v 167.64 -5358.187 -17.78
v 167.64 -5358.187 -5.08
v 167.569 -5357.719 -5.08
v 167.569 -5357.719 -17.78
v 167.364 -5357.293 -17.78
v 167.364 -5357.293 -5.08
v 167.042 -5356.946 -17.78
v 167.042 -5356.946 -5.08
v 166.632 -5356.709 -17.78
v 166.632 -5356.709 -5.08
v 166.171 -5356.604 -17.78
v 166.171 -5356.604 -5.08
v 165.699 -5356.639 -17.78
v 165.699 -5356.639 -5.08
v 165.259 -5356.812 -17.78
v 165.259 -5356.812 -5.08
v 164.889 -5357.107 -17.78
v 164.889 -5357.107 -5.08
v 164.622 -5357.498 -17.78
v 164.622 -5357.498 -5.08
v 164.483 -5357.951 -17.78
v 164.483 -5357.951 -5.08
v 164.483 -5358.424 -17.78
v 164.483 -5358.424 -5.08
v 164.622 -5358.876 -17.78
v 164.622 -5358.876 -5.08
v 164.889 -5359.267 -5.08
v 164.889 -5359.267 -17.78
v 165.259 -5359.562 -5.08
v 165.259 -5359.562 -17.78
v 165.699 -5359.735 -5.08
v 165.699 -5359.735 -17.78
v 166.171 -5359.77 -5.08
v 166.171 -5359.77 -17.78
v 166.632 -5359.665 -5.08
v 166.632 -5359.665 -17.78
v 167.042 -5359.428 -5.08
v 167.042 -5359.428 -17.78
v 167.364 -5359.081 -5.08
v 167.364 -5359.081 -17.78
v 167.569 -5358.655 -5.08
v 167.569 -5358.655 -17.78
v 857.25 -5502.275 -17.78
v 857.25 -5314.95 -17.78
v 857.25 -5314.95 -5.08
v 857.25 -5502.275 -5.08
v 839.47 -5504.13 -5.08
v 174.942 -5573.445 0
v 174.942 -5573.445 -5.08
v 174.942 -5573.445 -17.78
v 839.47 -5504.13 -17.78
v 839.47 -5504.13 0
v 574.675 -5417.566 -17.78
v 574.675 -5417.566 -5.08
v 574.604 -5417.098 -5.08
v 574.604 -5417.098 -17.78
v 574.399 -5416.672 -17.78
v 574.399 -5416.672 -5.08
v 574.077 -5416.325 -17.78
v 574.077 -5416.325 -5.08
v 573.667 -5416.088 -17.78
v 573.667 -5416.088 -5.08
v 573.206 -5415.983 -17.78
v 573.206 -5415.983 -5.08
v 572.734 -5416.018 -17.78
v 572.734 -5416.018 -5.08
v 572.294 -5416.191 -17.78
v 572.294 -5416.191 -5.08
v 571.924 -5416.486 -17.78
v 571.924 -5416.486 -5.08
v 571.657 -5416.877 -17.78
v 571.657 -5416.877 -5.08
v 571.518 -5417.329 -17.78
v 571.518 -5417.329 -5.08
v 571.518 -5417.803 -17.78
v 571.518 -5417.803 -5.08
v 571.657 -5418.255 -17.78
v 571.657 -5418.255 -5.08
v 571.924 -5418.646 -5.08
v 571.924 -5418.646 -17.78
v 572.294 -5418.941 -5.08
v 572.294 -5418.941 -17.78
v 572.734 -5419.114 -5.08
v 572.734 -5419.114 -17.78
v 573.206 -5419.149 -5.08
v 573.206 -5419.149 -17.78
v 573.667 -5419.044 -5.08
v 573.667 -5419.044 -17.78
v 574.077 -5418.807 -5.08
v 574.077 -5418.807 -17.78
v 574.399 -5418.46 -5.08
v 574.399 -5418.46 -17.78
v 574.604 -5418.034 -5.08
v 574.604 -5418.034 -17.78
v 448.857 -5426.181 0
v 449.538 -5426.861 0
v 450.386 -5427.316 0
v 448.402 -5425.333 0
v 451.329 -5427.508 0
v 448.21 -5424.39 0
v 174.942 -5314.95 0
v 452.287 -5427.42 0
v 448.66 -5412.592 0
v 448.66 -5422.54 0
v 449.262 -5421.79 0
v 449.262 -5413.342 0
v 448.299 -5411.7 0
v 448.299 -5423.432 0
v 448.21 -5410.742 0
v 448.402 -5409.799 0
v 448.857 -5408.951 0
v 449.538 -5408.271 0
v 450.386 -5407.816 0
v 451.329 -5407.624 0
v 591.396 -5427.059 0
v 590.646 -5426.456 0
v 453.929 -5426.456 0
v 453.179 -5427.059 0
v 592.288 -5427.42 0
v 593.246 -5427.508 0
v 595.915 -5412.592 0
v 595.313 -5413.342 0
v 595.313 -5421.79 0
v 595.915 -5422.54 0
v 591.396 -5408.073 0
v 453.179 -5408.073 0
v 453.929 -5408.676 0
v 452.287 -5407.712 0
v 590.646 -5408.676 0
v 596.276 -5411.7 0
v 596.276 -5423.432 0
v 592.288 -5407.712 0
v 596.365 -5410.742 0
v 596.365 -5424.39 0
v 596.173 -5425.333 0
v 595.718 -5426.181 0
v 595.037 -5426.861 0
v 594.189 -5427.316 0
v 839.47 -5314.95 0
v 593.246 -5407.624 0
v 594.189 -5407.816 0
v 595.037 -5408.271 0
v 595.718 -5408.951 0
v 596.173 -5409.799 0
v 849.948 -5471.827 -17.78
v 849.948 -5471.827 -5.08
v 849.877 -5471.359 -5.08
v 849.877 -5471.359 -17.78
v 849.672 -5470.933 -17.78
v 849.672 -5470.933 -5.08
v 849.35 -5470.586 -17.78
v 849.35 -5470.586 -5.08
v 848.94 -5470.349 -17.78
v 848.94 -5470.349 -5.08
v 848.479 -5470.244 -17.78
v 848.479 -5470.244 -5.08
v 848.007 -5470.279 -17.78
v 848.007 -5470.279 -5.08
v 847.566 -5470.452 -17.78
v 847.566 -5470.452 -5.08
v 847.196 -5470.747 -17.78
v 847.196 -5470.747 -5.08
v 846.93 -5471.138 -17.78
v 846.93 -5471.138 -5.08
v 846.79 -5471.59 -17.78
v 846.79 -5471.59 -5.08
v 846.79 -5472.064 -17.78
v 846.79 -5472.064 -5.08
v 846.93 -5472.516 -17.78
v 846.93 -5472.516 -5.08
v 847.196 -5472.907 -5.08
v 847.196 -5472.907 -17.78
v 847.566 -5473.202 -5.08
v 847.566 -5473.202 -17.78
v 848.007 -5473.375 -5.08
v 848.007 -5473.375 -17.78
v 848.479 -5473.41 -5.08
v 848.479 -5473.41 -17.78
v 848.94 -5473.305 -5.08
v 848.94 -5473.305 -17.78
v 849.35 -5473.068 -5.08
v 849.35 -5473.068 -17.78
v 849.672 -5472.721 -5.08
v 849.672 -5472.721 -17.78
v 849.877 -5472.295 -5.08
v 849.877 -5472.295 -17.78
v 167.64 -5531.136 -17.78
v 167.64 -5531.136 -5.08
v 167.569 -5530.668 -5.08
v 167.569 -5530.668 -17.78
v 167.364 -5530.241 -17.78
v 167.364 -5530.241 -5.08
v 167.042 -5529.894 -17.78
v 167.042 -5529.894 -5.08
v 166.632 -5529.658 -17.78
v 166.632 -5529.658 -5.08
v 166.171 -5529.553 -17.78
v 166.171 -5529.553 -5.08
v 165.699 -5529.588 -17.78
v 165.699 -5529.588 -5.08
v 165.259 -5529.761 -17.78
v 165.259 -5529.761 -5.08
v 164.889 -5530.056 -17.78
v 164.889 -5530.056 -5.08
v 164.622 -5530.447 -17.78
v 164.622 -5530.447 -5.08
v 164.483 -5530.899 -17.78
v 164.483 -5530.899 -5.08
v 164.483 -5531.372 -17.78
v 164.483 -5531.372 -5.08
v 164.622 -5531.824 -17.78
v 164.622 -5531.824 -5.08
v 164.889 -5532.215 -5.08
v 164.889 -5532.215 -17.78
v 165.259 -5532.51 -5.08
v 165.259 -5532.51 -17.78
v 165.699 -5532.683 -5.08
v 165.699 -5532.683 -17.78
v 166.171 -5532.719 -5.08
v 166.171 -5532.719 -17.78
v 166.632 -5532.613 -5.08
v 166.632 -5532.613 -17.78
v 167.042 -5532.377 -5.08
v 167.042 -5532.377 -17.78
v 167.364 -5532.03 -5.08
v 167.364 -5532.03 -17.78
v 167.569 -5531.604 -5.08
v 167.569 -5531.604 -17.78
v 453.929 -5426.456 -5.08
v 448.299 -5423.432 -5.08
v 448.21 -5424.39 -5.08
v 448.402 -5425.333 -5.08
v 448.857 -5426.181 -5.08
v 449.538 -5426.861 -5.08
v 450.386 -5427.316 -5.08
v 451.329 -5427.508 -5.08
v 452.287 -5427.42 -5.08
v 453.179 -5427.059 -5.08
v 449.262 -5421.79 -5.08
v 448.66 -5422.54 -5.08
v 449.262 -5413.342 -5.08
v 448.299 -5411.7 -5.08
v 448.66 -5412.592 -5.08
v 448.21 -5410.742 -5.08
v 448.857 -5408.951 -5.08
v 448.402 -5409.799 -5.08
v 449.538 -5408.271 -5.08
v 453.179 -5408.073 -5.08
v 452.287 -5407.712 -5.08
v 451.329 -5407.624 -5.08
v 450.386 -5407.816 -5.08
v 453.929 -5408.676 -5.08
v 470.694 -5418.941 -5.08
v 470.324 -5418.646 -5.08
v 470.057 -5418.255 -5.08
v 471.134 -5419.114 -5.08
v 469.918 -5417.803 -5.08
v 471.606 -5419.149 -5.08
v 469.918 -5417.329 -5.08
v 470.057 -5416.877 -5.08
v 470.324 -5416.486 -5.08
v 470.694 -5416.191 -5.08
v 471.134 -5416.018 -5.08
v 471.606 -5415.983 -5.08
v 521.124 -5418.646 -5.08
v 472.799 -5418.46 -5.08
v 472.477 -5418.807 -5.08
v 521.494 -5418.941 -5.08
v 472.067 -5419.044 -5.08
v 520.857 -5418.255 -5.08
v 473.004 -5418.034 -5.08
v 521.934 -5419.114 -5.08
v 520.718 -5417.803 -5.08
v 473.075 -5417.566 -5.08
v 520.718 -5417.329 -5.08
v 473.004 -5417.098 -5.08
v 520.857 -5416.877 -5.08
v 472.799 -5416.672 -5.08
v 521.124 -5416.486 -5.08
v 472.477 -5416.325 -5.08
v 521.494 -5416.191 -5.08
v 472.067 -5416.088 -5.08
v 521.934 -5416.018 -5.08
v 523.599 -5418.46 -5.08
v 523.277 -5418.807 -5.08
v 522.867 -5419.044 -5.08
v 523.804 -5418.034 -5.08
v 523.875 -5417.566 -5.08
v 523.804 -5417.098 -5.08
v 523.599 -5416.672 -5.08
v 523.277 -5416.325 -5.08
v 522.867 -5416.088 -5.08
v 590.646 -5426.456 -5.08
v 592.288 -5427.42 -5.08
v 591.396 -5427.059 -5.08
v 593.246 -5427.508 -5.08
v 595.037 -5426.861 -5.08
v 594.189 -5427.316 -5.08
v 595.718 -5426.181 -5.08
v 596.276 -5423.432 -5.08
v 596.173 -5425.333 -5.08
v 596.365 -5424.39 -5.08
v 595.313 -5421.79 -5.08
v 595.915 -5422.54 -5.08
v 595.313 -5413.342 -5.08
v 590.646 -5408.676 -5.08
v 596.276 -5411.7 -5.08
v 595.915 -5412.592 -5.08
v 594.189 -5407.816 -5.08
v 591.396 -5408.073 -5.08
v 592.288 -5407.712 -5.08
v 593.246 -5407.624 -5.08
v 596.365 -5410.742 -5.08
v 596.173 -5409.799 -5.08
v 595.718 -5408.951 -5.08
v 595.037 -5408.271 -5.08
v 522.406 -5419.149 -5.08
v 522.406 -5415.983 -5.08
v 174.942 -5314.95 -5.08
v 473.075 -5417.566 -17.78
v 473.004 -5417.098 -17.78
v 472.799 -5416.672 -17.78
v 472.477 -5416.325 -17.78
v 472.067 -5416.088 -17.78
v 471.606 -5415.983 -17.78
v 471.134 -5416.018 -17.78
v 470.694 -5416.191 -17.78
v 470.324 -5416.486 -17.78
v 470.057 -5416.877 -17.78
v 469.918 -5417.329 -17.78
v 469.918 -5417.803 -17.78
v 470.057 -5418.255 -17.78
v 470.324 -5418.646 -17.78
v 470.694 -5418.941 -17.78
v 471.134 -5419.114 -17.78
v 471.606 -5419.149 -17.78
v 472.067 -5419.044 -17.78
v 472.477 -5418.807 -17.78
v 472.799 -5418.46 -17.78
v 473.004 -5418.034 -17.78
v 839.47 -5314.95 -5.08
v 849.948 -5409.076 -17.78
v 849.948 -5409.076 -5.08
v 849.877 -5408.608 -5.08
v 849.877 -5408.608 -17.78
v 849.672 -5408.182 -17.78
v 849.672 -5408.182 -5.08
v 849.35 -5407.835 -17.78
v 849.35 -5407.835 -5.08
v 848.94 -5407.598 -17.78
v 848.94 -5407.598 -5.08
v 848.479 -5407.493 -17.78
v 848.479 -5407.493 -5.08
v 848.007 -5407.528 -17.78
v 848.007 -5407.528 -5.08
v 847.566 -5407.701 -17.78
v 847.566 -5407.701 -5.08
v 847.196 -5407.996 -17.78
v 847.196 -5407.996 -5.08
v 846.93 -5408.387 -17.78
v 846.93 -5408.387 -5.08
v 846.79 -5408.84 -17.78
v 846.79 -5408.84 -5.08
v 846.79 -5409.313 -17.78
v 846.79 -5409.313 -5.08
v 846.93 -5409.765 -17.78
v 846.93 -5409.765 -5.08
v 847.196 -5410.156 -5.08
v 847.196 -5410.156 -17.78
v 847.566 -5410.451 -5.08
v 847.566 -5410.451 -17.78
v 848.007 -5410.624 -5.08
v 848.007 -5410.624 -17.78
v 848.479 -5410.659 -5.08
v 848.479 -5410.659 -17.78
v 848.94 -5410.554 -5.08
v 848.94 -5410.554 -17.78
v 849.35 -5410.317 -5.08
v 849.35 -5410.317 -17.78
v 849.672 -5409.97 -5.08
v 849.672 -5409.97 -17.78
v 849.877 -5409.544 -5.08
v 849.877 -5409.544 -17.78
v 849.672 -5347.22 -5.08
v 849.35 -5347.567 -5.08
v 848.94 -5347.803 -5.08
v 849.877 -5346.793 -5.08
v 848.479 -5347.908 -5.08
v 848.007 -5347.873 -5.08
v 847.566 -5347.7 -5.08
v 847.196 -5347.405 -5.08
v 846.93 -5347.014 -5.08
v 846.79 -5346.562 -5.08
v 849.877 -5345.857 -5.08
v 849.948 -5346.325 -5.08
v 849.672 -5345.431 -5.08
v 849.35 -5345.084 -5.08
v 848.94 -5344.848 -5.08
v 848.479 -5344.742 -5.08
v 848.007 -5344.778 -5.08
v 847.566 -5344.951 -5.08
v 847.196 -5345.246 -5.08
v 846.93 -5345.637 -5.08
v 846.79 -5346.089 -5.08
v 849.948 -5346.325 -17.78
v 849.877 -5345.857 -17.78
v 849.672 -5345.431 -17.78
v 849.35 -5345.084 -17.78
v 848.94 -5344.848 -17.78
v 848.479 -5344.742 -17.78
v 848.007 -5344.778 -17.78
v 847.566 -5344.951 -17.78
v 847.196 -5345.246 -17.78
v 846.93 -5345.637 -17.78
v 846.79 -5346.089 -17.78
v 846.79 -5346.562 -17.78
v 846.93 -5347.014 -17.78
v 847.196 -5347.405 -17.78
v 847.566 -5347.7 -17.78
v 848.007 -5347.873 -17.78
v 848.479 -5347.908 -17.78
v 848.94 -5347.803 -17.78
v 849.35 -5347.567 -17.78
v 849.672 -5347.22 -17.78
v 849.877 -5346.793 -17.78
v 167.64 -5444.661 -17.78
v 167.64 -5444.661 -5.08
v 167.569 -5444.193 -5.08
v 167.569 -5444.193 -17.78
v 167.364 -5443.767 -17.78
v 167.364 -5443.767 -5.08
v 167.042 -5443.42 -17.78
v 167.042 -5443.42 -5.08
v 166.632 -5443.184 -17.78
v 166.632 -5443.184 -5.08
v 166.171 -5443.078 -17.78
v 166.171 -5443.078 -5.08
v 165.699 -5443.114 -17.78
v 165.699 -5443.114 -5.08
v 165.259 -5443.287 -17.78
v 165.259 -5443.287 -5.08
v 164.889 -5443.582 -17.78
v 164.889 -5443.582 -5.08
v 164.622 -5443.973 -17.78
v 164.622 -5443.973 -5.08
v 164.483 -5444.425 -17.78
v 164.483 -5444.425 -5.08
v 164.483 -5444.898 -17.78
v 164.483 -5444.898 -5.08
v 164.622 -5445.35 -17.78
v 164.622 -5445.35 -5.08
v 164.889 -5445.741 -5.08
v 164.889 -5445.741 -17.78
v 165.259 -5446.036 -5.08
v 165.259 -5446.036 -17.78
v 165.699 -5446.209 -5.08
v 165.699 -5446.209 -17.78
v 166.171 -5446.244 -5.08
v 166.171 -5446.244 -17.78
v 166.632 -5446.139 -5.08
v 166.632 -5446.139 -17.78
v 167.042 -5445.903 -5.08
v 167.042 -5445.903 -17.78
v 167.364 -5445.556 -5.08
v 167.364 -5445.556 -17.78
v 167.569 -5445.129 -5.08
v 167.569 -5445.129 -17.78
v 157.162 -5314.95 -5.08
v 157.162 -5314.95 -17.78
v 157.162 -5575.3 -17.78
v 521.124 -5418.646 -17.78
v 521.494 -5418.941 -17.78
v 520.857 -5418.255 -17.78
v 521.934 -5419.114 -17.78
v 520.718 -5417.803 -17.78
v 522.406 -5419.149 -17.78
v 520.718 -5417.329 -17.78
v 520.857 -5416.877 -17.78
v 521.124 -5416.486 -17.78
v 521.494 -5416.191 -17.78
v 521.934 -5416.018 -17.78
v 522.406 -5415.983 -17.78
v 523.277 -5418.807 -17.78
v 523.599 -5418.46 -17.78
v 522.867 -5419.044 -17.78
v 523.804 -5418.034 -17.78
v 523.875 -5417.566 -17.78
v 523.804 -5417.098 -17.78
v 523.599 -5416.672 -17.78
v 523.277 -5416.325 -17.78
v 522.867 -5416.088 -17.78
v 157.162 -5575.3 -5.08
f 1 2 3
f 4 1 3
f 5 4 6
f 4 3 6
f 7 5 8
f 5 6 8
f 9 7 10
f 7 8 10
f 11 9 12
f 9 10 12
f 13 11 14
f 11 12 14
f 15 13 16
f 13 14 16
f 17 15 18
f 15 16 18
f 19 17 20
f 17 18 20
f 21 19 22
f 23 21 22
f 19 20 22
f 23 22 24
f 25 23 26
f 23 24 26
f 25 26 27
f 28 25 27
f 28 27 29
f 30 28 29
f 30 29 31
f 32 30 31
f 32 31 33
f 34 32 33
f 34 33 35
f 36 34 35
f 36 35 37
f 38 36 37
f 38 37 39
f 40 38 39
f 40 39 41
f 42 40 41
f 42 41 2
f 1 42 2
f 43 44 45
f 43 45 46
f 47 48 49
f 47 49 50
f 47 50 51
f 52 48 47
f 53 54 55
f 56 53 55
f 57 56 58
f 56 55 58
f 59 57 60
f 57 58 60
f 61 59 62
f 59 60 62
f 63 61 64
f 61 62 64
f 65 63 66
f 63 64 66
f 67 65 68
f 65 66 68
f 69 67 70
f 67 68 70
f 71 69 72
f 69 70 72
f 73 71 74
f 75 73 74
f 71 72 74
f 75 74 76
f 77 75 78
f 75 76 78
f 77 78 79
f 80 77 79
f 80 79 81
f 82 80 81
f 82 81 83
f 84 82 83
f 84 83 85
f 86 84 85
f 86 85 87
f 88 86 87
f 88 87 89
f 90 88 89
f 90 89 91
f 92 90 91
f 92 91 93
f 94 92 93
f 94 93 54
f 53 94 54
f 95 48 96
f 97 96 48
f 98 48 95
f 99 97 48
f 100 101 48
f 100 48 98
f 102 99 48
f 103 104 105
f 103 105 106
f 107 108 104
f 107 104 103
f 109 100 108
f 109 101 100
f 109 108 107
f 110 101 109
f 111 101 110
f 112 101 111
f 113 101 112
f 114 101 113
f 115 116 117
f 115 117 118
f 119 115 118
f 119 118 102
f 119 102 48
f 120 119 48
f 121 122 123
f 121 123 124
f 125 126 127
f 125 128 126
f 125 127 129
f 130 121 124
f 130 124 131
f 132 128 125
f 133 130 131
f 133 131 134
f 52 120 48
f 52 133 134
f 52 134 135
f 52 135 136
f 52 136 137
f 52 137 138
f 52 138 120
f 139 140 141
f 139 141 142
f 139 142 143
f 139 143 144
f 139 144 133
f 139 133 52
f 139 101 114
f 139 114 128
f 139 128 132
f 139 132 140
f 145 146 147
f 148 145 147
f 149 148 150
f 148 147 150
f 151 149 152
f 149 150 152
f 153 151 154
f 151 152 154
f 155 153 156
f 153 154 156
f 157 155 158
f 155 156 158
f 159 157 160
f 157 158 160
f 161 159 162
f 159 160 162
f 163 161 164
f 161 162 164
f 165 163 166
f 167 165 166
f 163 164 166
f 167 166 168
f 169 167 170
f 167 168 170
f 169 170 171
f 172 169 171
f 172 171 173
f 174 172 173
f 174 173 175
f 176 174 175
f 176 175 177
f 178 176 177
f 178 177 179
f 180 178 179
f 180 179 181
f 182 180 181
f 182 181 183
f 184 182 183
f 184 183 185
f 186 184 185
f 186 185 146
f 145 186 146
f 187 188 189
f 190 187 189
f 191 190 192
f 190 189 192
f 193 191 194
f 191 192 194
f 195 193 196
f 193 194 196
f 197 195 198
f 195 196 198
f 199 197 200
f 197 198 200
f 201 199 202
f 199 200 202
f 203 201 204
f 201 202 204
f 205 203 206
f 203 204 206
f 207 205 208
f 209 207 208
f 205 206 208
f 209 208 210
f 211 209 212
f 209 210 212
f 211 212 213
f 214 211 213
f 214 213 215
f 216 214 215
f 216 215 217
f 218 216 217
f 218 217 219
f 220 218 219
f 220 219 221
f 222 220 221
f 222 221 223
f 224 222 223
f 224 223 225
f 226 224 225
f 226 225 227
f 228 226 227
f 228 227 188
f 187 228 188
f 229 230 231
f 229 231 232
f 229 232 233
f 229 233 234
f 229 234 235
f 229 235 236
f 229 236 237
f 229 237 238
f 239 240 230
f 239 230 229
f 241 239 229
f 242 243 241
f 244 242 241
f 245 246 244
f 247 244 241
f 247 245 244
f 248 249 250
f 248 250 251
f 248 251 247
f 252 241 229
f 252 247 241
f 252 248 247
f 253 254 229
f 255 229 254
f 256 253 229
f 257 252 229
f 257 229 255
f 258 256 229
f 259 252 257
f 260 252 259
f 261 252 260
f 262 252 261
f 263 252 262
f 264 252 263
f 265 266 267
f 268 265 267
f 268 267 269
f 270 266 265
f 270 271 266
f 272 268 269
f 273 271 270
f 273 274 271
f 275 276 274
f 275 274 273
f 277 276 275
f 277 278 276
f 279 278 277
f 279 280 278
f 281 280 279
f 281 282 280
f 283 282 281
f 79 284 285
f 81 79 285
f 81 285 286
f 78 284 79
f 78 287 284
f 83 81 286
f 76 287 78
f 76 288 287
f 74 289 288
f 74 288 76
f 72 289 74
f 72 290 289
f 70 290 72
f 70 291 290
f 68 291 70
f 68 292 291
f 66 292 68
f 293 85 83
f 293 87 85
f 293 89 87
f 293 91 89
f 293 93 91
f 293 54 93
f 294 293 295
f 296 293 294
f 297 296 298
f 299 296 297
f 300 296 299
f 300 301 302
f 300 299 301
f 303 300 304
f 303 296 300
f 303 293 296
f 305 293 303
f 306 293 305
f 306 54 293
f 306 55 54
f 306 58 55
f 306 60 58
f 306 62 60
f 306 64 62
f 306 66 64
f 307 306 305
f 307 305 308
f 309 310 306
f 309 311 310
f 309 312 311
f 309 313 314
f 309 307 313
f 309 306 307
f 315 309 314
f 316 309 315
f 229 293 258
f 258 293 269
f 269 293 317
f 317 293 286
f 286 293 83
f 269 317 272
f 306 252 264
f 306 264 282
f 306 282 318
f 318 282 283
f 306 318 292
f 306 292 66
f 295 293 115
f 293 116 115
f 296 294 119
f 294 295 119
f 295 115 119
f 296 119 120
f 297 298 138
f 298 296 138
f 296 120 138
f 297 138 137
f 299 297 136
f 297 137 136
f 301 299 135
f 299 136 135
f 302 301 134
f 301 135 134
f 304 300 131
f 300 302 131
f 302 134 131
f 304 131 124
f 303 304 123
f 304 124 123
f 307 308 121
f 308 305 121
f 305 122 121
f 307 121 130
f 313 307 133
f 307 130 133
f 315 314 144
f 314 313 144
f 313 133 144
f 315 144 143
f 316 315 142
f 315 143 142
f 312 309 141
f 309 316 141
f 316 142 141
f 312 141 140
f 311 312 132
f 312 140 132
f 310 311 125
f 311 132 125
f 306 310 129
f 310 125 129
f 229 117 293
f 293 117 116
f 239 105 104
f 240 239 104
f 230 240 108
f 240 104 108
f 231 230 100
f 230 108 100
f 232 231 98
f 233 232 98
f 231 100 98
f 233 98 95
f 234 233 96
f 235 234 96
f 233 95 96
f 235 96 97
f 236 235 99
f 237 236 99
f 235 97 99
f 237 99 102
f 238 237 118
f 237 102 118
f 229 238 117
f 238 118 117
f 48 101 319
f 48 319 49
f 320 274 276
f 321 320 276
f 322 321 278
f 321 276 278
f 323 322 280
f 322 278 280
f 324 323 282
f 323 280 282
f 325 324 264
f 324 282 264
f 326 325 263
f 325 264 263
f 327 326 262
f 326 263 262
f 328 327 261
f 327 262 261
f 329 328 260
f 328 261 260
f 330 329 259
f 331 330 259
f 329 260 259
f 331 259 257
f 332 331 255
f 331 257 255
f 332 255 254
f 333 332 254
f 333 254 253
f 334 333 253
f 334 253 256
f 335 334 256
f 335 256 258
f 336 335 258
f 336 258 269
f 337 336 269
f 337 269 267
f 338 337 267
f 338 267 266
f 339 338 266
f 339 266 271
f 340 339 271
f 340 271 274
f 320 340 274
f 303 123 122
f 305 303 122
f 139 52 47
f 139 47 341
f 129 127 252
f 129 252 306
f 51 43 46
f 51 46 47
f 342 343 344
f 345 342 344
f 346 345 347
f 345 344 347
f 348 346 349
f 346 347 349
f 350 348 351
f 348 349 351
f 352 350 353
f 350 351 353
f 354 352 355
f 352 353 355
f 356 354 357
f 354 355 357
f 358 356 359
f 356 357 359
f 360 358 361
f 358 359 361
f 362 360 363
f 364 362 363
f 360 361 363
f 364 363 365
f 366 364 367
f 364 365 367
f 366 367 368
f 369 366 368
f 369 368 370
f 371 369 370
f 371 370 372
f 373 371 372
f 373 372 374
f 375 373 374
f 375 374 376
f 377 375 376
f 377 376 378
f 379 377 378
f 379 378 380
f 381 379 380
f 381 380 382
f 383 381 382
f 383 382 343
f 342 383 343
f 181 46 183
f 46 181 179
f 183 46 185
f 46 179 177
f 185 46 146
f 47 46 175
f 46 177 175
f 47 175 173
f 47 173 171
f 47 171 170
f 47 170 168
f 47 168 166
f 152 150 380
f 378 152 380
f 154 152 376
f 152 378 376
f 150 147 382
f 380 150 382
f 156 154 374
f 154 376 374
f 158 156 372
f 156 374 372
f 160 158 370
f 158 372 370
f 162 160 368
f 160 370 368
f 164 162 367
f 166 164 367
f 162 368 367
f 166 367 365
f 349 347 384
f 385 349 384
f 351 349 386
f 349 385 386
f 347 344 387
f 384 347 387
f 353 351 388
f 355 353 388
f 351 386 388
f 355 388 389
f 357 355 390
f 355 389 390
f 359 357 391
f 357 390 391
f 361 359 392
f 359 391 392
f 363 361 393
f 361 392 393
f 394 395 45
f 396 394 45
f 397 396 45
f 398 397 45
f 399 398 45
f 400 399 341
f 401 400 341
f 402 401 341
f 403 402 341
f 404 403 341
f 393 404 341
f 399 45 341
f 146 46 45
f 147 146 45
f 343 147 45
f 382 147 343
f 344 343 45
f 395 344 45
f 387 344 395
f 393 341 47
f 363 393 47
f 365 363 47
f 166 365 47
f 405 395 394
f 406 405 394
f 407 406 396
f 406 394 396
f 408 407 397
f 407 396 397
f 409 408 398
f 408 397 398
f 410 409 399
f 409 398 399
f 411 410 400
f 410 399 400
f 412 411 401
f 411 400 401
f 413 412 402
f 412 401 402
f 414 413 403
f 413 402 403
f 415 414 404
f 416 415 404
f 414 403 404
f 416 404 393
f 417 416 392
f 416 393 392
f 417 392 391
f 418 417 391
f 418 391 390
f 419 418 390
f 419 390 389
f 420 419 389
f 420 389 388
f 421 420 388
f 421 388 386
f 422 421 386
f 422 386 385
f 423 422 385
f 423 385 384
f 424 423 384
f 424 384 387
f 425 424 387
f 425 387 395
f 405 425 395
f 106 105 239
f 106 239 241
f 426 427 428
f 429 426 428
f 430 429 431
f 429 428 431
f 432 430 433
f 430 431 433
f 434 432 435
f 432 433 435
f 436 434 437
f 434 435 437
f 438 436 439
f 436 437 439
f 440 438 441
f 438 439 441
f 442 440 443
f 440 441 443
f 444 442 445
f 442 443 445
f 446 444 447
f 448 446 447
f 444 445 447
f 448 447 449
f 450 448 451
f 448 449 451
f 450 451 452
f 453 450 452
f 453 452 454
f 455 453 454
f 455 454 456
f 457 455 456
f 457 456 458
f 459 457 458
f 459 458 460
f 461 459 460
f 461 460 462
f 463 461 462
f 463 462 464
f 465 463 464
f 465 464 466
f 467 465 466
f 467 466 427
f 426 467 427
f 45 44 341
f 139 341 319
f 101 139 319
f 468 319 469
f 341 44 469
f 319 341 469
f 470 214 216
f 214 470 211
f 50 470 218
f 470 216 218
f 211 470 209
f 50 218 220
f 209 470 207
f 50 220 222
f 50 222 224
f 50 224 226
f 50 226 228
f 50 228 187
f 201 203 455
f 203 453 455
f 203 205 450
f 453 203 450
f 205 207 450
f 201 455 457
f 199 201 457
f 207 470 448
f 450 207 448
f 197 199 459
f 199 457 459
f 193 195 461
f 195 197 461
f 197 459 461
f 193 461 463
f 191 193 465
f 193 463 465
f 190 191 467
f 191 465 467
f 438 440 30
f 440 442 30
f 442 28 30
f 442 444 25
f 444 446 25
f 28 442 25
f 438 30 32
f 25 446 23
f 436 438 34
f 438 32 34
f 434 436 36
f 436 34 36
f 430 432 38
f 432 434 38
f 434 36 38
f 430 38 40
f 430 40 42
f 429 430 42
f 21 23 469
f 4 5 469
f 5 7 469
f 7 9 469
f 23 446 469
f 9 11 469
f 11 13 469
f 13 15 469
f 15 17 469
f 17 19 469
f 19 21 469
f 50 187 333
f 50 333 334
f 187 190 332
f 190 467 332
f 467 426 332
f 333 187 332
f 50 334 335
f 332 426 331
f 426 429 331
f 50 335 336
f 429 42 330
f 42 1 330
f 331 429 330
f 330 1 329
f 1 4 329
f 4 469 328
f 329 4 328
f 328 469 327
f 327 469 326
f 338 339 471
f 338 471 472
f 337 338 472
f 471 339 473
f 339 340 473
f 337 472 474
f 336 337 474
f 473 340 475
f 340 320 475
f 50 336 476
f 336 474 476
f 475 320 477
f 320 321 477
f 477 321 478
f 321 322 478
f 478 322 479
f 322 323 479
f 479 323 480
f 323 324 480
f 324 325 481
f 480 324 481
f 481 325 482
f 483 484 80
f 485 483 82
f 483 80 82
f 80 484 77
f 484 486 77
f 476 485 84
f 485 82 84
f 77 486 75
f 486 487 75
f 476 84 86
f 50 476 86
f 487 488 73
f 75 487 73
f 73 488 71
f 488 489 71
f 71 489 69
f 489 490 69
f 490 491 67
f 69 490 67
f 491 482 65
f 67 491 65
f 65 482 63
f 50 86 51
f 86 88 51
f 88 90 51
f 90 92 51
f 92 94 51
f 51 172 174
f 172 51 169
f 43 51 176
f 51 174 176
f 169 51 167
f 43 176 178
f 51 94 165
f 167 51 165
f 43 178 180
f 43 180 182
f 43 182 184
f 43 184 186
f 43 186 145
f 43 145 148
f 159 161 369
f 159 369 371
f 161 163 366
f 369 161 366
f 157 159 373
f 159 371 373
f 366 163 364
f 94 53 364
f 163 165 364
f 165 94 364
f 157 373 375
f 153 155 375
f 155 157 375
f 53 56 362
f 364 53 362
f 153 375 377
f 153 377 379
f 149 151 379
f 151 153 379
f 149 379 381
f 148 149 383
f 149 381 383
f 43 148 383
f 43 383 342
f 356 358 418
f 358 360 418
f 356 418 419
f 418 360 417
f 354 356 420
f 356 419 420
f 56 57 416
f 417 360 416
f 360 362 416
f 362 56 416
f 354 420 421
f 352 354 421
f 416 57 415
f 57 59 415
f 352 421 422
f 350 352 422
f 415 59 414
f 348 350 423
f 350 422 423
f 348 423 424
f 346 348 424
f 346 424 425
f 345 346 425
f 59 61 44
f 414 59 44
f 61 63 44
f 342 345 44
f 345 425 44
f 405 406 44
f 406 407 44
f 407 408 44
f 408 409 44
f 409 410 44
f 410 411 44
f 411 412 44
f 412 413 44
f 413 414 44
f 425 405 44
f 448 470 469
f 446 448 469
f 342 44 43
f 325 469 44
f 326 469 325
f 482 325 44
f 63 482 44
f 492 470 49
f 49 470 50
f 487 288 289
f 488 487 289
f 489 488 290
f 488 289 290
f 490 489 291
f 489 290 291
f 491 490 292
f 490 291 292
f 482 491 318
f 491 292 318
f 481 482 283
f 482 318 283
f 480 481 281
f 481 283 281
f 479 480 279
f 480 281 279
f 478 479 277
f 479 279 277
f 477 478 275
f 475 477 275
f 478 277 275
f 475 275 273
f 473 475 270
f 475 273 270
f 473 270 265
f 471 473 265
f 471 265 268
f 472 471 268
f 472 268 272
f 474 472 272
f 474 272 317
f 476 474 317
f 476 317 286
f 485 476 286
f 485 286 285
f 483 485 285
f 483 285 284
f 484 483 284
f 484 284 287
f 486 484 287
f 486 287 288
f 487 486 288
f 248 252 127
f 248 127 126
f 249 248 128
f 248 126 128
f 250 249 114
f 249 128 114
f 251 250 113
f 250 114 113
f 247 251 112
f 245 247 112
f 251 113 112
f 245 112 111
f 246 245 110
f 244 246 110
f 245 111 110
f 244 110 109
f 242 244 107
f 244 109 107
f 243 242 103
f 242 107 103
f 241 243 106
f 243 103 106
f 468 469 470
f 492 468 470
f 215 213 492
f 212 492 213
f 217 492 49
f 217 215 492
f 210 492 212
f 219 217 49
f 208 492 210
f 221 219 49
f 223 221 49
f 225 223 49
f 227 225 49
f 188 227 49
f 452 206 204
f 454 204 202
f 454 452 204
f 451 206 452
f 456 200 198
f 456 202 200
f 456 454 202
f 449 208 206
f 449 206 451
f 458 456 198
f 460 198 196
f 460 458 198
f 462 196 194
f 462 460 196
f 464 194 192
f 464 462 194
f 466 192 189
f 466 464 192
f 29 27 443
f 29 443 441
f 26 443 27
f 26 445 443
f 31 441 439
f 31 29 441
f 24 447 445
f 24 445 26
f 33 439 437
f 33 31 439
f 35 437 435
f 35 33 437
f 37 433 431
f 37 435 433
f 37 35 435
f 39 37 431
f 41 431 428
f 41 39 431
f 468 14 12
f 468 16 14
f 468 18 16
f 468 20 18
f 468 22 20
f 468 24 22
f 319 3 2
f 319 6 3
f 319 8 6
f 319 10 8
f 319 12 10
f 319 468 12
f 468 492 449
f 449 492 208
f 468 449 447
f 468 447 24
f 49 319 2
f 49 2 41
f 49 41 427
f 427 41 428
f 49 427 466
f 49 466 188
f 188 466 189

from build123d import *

# Parameters (mm, degrees)
HEADSIDELEFT_THICKNESS_DEPTH      = 17.78
HEADSIDELEFTLEDGE_THICKNESS_DEPTH = 12.7
SKETCH4_W                         = 146.050000002
SKETCH4_H                         = 17.78
CUT_EXTRUDE2_DEPTH                = 5.08
SKETCH6_R                         = 3.302000001
SKETCH6_R_2                       = 3.302
CUT_EXTRUDE3_DEPTH                = 5.08
SKETCH3_R                         = 1.5875
CUT_EXTRUDE1_DEPTH                = 17.78


with BuildPart() as part:
    # HeadSideLeftOutline → HeadSideLeft_Thickness (new body)
    with BuildSketch(Plane.XY):
        Polygon((839.47, -5504.129603175), (839.47, -5314.95), (174.9425, -5314.95), (174.9425, -5573.445396825), align=None)
    extrude(amount=-HEADSIDELEFT_THICKNESS_DEPTH)

    # HeadSideLeftLedge → HeadSideLeftLedge_Thickness (add)
    with BuildSketch(Plane(origin=(0, 0, -17.78), x_dir=(-1, 0, 0), z_dir=(0, 0, -1))):
        Polygon((-174.9425, -5314.95), (-157.1625, -5314.95), (-157.1625, -5575.3), (-174.9425, -5573.445396825), align=None)
        Polygon((-839.47, -5314.95), (-857.25, -5314.95), (-857.25, -5502.275), (-839.47, -5504.129603175), align=None)
    extrude(amount=-HEADSIDELEFTLEDGE_THICKNESS_DEPTH)

    # Sketch4 → Cut-Extrude2 (cut)
    with BuildSketch(Plane.XY):
        with Locations((522.2875, -5417.566000001)):
            Rectangle(SKETCH4_W, SKETCH4_H)
    extrude(amount=-CUT_EXTRUDE2_DEPTH, mode=Mode.SUBTRACT)

    # Sketch6 → Cut-Extrude3 (cut)
    with BuildSketch(Plane.XY):
        with Locations((451.507564029, -5410.921064031)):
            Circle(SKETCH6_R)
        with Locations((451.507564029, -5424.210935971)):
            Circle(SKETCH6_R_2)
        with Locations((593.067435971, -5424.210935971)):
            Circle(SKETCH6_R_2)
        with Locations((593.067435971, -5410.921064031)):
            Circle(SKETCH6_R)
    extrude(amount=-CUT_EXTRUDE3_DEPTH, mode=Mode.SUBTRACT)

    # Sketch3 → Cut-Extrude1 (cut)
    with BuildSketch(Plane.XY):
        with Locations((166.0525, -5531.135582009)):
            Circle(SKETCH3_R)
        with Locations((166.0525, -5444.661349205)):
            Circle(SKETCH3_R)
        with Locations((166.0525, -5358.187116401)):
            Circle(SKETCH3_R)
        with Locations((848.36, -5471.826917991)):
            Circle(SKETCH3_R)
        with Locations((848.36, -5409.076150795)):
            Circle(SKETCH3_R)
        with Locations((848.36, -5346.325383599)):
            Circle(SKETCH3_R)
        with Locations((573.0875, -5417.566)):
            Circle(SKETCH3_R)
        with Locations((522.2875, -5417.566)):
            Circle(SKETCH3_R)
        with Locations((471.4875, -5417.566)):
            Circle(SKETCH3_R)
    extrude(amount=-CUT_EXTRUDE1_DEPTH, mode=Mode.SUBTRACT)


solid = part.part
